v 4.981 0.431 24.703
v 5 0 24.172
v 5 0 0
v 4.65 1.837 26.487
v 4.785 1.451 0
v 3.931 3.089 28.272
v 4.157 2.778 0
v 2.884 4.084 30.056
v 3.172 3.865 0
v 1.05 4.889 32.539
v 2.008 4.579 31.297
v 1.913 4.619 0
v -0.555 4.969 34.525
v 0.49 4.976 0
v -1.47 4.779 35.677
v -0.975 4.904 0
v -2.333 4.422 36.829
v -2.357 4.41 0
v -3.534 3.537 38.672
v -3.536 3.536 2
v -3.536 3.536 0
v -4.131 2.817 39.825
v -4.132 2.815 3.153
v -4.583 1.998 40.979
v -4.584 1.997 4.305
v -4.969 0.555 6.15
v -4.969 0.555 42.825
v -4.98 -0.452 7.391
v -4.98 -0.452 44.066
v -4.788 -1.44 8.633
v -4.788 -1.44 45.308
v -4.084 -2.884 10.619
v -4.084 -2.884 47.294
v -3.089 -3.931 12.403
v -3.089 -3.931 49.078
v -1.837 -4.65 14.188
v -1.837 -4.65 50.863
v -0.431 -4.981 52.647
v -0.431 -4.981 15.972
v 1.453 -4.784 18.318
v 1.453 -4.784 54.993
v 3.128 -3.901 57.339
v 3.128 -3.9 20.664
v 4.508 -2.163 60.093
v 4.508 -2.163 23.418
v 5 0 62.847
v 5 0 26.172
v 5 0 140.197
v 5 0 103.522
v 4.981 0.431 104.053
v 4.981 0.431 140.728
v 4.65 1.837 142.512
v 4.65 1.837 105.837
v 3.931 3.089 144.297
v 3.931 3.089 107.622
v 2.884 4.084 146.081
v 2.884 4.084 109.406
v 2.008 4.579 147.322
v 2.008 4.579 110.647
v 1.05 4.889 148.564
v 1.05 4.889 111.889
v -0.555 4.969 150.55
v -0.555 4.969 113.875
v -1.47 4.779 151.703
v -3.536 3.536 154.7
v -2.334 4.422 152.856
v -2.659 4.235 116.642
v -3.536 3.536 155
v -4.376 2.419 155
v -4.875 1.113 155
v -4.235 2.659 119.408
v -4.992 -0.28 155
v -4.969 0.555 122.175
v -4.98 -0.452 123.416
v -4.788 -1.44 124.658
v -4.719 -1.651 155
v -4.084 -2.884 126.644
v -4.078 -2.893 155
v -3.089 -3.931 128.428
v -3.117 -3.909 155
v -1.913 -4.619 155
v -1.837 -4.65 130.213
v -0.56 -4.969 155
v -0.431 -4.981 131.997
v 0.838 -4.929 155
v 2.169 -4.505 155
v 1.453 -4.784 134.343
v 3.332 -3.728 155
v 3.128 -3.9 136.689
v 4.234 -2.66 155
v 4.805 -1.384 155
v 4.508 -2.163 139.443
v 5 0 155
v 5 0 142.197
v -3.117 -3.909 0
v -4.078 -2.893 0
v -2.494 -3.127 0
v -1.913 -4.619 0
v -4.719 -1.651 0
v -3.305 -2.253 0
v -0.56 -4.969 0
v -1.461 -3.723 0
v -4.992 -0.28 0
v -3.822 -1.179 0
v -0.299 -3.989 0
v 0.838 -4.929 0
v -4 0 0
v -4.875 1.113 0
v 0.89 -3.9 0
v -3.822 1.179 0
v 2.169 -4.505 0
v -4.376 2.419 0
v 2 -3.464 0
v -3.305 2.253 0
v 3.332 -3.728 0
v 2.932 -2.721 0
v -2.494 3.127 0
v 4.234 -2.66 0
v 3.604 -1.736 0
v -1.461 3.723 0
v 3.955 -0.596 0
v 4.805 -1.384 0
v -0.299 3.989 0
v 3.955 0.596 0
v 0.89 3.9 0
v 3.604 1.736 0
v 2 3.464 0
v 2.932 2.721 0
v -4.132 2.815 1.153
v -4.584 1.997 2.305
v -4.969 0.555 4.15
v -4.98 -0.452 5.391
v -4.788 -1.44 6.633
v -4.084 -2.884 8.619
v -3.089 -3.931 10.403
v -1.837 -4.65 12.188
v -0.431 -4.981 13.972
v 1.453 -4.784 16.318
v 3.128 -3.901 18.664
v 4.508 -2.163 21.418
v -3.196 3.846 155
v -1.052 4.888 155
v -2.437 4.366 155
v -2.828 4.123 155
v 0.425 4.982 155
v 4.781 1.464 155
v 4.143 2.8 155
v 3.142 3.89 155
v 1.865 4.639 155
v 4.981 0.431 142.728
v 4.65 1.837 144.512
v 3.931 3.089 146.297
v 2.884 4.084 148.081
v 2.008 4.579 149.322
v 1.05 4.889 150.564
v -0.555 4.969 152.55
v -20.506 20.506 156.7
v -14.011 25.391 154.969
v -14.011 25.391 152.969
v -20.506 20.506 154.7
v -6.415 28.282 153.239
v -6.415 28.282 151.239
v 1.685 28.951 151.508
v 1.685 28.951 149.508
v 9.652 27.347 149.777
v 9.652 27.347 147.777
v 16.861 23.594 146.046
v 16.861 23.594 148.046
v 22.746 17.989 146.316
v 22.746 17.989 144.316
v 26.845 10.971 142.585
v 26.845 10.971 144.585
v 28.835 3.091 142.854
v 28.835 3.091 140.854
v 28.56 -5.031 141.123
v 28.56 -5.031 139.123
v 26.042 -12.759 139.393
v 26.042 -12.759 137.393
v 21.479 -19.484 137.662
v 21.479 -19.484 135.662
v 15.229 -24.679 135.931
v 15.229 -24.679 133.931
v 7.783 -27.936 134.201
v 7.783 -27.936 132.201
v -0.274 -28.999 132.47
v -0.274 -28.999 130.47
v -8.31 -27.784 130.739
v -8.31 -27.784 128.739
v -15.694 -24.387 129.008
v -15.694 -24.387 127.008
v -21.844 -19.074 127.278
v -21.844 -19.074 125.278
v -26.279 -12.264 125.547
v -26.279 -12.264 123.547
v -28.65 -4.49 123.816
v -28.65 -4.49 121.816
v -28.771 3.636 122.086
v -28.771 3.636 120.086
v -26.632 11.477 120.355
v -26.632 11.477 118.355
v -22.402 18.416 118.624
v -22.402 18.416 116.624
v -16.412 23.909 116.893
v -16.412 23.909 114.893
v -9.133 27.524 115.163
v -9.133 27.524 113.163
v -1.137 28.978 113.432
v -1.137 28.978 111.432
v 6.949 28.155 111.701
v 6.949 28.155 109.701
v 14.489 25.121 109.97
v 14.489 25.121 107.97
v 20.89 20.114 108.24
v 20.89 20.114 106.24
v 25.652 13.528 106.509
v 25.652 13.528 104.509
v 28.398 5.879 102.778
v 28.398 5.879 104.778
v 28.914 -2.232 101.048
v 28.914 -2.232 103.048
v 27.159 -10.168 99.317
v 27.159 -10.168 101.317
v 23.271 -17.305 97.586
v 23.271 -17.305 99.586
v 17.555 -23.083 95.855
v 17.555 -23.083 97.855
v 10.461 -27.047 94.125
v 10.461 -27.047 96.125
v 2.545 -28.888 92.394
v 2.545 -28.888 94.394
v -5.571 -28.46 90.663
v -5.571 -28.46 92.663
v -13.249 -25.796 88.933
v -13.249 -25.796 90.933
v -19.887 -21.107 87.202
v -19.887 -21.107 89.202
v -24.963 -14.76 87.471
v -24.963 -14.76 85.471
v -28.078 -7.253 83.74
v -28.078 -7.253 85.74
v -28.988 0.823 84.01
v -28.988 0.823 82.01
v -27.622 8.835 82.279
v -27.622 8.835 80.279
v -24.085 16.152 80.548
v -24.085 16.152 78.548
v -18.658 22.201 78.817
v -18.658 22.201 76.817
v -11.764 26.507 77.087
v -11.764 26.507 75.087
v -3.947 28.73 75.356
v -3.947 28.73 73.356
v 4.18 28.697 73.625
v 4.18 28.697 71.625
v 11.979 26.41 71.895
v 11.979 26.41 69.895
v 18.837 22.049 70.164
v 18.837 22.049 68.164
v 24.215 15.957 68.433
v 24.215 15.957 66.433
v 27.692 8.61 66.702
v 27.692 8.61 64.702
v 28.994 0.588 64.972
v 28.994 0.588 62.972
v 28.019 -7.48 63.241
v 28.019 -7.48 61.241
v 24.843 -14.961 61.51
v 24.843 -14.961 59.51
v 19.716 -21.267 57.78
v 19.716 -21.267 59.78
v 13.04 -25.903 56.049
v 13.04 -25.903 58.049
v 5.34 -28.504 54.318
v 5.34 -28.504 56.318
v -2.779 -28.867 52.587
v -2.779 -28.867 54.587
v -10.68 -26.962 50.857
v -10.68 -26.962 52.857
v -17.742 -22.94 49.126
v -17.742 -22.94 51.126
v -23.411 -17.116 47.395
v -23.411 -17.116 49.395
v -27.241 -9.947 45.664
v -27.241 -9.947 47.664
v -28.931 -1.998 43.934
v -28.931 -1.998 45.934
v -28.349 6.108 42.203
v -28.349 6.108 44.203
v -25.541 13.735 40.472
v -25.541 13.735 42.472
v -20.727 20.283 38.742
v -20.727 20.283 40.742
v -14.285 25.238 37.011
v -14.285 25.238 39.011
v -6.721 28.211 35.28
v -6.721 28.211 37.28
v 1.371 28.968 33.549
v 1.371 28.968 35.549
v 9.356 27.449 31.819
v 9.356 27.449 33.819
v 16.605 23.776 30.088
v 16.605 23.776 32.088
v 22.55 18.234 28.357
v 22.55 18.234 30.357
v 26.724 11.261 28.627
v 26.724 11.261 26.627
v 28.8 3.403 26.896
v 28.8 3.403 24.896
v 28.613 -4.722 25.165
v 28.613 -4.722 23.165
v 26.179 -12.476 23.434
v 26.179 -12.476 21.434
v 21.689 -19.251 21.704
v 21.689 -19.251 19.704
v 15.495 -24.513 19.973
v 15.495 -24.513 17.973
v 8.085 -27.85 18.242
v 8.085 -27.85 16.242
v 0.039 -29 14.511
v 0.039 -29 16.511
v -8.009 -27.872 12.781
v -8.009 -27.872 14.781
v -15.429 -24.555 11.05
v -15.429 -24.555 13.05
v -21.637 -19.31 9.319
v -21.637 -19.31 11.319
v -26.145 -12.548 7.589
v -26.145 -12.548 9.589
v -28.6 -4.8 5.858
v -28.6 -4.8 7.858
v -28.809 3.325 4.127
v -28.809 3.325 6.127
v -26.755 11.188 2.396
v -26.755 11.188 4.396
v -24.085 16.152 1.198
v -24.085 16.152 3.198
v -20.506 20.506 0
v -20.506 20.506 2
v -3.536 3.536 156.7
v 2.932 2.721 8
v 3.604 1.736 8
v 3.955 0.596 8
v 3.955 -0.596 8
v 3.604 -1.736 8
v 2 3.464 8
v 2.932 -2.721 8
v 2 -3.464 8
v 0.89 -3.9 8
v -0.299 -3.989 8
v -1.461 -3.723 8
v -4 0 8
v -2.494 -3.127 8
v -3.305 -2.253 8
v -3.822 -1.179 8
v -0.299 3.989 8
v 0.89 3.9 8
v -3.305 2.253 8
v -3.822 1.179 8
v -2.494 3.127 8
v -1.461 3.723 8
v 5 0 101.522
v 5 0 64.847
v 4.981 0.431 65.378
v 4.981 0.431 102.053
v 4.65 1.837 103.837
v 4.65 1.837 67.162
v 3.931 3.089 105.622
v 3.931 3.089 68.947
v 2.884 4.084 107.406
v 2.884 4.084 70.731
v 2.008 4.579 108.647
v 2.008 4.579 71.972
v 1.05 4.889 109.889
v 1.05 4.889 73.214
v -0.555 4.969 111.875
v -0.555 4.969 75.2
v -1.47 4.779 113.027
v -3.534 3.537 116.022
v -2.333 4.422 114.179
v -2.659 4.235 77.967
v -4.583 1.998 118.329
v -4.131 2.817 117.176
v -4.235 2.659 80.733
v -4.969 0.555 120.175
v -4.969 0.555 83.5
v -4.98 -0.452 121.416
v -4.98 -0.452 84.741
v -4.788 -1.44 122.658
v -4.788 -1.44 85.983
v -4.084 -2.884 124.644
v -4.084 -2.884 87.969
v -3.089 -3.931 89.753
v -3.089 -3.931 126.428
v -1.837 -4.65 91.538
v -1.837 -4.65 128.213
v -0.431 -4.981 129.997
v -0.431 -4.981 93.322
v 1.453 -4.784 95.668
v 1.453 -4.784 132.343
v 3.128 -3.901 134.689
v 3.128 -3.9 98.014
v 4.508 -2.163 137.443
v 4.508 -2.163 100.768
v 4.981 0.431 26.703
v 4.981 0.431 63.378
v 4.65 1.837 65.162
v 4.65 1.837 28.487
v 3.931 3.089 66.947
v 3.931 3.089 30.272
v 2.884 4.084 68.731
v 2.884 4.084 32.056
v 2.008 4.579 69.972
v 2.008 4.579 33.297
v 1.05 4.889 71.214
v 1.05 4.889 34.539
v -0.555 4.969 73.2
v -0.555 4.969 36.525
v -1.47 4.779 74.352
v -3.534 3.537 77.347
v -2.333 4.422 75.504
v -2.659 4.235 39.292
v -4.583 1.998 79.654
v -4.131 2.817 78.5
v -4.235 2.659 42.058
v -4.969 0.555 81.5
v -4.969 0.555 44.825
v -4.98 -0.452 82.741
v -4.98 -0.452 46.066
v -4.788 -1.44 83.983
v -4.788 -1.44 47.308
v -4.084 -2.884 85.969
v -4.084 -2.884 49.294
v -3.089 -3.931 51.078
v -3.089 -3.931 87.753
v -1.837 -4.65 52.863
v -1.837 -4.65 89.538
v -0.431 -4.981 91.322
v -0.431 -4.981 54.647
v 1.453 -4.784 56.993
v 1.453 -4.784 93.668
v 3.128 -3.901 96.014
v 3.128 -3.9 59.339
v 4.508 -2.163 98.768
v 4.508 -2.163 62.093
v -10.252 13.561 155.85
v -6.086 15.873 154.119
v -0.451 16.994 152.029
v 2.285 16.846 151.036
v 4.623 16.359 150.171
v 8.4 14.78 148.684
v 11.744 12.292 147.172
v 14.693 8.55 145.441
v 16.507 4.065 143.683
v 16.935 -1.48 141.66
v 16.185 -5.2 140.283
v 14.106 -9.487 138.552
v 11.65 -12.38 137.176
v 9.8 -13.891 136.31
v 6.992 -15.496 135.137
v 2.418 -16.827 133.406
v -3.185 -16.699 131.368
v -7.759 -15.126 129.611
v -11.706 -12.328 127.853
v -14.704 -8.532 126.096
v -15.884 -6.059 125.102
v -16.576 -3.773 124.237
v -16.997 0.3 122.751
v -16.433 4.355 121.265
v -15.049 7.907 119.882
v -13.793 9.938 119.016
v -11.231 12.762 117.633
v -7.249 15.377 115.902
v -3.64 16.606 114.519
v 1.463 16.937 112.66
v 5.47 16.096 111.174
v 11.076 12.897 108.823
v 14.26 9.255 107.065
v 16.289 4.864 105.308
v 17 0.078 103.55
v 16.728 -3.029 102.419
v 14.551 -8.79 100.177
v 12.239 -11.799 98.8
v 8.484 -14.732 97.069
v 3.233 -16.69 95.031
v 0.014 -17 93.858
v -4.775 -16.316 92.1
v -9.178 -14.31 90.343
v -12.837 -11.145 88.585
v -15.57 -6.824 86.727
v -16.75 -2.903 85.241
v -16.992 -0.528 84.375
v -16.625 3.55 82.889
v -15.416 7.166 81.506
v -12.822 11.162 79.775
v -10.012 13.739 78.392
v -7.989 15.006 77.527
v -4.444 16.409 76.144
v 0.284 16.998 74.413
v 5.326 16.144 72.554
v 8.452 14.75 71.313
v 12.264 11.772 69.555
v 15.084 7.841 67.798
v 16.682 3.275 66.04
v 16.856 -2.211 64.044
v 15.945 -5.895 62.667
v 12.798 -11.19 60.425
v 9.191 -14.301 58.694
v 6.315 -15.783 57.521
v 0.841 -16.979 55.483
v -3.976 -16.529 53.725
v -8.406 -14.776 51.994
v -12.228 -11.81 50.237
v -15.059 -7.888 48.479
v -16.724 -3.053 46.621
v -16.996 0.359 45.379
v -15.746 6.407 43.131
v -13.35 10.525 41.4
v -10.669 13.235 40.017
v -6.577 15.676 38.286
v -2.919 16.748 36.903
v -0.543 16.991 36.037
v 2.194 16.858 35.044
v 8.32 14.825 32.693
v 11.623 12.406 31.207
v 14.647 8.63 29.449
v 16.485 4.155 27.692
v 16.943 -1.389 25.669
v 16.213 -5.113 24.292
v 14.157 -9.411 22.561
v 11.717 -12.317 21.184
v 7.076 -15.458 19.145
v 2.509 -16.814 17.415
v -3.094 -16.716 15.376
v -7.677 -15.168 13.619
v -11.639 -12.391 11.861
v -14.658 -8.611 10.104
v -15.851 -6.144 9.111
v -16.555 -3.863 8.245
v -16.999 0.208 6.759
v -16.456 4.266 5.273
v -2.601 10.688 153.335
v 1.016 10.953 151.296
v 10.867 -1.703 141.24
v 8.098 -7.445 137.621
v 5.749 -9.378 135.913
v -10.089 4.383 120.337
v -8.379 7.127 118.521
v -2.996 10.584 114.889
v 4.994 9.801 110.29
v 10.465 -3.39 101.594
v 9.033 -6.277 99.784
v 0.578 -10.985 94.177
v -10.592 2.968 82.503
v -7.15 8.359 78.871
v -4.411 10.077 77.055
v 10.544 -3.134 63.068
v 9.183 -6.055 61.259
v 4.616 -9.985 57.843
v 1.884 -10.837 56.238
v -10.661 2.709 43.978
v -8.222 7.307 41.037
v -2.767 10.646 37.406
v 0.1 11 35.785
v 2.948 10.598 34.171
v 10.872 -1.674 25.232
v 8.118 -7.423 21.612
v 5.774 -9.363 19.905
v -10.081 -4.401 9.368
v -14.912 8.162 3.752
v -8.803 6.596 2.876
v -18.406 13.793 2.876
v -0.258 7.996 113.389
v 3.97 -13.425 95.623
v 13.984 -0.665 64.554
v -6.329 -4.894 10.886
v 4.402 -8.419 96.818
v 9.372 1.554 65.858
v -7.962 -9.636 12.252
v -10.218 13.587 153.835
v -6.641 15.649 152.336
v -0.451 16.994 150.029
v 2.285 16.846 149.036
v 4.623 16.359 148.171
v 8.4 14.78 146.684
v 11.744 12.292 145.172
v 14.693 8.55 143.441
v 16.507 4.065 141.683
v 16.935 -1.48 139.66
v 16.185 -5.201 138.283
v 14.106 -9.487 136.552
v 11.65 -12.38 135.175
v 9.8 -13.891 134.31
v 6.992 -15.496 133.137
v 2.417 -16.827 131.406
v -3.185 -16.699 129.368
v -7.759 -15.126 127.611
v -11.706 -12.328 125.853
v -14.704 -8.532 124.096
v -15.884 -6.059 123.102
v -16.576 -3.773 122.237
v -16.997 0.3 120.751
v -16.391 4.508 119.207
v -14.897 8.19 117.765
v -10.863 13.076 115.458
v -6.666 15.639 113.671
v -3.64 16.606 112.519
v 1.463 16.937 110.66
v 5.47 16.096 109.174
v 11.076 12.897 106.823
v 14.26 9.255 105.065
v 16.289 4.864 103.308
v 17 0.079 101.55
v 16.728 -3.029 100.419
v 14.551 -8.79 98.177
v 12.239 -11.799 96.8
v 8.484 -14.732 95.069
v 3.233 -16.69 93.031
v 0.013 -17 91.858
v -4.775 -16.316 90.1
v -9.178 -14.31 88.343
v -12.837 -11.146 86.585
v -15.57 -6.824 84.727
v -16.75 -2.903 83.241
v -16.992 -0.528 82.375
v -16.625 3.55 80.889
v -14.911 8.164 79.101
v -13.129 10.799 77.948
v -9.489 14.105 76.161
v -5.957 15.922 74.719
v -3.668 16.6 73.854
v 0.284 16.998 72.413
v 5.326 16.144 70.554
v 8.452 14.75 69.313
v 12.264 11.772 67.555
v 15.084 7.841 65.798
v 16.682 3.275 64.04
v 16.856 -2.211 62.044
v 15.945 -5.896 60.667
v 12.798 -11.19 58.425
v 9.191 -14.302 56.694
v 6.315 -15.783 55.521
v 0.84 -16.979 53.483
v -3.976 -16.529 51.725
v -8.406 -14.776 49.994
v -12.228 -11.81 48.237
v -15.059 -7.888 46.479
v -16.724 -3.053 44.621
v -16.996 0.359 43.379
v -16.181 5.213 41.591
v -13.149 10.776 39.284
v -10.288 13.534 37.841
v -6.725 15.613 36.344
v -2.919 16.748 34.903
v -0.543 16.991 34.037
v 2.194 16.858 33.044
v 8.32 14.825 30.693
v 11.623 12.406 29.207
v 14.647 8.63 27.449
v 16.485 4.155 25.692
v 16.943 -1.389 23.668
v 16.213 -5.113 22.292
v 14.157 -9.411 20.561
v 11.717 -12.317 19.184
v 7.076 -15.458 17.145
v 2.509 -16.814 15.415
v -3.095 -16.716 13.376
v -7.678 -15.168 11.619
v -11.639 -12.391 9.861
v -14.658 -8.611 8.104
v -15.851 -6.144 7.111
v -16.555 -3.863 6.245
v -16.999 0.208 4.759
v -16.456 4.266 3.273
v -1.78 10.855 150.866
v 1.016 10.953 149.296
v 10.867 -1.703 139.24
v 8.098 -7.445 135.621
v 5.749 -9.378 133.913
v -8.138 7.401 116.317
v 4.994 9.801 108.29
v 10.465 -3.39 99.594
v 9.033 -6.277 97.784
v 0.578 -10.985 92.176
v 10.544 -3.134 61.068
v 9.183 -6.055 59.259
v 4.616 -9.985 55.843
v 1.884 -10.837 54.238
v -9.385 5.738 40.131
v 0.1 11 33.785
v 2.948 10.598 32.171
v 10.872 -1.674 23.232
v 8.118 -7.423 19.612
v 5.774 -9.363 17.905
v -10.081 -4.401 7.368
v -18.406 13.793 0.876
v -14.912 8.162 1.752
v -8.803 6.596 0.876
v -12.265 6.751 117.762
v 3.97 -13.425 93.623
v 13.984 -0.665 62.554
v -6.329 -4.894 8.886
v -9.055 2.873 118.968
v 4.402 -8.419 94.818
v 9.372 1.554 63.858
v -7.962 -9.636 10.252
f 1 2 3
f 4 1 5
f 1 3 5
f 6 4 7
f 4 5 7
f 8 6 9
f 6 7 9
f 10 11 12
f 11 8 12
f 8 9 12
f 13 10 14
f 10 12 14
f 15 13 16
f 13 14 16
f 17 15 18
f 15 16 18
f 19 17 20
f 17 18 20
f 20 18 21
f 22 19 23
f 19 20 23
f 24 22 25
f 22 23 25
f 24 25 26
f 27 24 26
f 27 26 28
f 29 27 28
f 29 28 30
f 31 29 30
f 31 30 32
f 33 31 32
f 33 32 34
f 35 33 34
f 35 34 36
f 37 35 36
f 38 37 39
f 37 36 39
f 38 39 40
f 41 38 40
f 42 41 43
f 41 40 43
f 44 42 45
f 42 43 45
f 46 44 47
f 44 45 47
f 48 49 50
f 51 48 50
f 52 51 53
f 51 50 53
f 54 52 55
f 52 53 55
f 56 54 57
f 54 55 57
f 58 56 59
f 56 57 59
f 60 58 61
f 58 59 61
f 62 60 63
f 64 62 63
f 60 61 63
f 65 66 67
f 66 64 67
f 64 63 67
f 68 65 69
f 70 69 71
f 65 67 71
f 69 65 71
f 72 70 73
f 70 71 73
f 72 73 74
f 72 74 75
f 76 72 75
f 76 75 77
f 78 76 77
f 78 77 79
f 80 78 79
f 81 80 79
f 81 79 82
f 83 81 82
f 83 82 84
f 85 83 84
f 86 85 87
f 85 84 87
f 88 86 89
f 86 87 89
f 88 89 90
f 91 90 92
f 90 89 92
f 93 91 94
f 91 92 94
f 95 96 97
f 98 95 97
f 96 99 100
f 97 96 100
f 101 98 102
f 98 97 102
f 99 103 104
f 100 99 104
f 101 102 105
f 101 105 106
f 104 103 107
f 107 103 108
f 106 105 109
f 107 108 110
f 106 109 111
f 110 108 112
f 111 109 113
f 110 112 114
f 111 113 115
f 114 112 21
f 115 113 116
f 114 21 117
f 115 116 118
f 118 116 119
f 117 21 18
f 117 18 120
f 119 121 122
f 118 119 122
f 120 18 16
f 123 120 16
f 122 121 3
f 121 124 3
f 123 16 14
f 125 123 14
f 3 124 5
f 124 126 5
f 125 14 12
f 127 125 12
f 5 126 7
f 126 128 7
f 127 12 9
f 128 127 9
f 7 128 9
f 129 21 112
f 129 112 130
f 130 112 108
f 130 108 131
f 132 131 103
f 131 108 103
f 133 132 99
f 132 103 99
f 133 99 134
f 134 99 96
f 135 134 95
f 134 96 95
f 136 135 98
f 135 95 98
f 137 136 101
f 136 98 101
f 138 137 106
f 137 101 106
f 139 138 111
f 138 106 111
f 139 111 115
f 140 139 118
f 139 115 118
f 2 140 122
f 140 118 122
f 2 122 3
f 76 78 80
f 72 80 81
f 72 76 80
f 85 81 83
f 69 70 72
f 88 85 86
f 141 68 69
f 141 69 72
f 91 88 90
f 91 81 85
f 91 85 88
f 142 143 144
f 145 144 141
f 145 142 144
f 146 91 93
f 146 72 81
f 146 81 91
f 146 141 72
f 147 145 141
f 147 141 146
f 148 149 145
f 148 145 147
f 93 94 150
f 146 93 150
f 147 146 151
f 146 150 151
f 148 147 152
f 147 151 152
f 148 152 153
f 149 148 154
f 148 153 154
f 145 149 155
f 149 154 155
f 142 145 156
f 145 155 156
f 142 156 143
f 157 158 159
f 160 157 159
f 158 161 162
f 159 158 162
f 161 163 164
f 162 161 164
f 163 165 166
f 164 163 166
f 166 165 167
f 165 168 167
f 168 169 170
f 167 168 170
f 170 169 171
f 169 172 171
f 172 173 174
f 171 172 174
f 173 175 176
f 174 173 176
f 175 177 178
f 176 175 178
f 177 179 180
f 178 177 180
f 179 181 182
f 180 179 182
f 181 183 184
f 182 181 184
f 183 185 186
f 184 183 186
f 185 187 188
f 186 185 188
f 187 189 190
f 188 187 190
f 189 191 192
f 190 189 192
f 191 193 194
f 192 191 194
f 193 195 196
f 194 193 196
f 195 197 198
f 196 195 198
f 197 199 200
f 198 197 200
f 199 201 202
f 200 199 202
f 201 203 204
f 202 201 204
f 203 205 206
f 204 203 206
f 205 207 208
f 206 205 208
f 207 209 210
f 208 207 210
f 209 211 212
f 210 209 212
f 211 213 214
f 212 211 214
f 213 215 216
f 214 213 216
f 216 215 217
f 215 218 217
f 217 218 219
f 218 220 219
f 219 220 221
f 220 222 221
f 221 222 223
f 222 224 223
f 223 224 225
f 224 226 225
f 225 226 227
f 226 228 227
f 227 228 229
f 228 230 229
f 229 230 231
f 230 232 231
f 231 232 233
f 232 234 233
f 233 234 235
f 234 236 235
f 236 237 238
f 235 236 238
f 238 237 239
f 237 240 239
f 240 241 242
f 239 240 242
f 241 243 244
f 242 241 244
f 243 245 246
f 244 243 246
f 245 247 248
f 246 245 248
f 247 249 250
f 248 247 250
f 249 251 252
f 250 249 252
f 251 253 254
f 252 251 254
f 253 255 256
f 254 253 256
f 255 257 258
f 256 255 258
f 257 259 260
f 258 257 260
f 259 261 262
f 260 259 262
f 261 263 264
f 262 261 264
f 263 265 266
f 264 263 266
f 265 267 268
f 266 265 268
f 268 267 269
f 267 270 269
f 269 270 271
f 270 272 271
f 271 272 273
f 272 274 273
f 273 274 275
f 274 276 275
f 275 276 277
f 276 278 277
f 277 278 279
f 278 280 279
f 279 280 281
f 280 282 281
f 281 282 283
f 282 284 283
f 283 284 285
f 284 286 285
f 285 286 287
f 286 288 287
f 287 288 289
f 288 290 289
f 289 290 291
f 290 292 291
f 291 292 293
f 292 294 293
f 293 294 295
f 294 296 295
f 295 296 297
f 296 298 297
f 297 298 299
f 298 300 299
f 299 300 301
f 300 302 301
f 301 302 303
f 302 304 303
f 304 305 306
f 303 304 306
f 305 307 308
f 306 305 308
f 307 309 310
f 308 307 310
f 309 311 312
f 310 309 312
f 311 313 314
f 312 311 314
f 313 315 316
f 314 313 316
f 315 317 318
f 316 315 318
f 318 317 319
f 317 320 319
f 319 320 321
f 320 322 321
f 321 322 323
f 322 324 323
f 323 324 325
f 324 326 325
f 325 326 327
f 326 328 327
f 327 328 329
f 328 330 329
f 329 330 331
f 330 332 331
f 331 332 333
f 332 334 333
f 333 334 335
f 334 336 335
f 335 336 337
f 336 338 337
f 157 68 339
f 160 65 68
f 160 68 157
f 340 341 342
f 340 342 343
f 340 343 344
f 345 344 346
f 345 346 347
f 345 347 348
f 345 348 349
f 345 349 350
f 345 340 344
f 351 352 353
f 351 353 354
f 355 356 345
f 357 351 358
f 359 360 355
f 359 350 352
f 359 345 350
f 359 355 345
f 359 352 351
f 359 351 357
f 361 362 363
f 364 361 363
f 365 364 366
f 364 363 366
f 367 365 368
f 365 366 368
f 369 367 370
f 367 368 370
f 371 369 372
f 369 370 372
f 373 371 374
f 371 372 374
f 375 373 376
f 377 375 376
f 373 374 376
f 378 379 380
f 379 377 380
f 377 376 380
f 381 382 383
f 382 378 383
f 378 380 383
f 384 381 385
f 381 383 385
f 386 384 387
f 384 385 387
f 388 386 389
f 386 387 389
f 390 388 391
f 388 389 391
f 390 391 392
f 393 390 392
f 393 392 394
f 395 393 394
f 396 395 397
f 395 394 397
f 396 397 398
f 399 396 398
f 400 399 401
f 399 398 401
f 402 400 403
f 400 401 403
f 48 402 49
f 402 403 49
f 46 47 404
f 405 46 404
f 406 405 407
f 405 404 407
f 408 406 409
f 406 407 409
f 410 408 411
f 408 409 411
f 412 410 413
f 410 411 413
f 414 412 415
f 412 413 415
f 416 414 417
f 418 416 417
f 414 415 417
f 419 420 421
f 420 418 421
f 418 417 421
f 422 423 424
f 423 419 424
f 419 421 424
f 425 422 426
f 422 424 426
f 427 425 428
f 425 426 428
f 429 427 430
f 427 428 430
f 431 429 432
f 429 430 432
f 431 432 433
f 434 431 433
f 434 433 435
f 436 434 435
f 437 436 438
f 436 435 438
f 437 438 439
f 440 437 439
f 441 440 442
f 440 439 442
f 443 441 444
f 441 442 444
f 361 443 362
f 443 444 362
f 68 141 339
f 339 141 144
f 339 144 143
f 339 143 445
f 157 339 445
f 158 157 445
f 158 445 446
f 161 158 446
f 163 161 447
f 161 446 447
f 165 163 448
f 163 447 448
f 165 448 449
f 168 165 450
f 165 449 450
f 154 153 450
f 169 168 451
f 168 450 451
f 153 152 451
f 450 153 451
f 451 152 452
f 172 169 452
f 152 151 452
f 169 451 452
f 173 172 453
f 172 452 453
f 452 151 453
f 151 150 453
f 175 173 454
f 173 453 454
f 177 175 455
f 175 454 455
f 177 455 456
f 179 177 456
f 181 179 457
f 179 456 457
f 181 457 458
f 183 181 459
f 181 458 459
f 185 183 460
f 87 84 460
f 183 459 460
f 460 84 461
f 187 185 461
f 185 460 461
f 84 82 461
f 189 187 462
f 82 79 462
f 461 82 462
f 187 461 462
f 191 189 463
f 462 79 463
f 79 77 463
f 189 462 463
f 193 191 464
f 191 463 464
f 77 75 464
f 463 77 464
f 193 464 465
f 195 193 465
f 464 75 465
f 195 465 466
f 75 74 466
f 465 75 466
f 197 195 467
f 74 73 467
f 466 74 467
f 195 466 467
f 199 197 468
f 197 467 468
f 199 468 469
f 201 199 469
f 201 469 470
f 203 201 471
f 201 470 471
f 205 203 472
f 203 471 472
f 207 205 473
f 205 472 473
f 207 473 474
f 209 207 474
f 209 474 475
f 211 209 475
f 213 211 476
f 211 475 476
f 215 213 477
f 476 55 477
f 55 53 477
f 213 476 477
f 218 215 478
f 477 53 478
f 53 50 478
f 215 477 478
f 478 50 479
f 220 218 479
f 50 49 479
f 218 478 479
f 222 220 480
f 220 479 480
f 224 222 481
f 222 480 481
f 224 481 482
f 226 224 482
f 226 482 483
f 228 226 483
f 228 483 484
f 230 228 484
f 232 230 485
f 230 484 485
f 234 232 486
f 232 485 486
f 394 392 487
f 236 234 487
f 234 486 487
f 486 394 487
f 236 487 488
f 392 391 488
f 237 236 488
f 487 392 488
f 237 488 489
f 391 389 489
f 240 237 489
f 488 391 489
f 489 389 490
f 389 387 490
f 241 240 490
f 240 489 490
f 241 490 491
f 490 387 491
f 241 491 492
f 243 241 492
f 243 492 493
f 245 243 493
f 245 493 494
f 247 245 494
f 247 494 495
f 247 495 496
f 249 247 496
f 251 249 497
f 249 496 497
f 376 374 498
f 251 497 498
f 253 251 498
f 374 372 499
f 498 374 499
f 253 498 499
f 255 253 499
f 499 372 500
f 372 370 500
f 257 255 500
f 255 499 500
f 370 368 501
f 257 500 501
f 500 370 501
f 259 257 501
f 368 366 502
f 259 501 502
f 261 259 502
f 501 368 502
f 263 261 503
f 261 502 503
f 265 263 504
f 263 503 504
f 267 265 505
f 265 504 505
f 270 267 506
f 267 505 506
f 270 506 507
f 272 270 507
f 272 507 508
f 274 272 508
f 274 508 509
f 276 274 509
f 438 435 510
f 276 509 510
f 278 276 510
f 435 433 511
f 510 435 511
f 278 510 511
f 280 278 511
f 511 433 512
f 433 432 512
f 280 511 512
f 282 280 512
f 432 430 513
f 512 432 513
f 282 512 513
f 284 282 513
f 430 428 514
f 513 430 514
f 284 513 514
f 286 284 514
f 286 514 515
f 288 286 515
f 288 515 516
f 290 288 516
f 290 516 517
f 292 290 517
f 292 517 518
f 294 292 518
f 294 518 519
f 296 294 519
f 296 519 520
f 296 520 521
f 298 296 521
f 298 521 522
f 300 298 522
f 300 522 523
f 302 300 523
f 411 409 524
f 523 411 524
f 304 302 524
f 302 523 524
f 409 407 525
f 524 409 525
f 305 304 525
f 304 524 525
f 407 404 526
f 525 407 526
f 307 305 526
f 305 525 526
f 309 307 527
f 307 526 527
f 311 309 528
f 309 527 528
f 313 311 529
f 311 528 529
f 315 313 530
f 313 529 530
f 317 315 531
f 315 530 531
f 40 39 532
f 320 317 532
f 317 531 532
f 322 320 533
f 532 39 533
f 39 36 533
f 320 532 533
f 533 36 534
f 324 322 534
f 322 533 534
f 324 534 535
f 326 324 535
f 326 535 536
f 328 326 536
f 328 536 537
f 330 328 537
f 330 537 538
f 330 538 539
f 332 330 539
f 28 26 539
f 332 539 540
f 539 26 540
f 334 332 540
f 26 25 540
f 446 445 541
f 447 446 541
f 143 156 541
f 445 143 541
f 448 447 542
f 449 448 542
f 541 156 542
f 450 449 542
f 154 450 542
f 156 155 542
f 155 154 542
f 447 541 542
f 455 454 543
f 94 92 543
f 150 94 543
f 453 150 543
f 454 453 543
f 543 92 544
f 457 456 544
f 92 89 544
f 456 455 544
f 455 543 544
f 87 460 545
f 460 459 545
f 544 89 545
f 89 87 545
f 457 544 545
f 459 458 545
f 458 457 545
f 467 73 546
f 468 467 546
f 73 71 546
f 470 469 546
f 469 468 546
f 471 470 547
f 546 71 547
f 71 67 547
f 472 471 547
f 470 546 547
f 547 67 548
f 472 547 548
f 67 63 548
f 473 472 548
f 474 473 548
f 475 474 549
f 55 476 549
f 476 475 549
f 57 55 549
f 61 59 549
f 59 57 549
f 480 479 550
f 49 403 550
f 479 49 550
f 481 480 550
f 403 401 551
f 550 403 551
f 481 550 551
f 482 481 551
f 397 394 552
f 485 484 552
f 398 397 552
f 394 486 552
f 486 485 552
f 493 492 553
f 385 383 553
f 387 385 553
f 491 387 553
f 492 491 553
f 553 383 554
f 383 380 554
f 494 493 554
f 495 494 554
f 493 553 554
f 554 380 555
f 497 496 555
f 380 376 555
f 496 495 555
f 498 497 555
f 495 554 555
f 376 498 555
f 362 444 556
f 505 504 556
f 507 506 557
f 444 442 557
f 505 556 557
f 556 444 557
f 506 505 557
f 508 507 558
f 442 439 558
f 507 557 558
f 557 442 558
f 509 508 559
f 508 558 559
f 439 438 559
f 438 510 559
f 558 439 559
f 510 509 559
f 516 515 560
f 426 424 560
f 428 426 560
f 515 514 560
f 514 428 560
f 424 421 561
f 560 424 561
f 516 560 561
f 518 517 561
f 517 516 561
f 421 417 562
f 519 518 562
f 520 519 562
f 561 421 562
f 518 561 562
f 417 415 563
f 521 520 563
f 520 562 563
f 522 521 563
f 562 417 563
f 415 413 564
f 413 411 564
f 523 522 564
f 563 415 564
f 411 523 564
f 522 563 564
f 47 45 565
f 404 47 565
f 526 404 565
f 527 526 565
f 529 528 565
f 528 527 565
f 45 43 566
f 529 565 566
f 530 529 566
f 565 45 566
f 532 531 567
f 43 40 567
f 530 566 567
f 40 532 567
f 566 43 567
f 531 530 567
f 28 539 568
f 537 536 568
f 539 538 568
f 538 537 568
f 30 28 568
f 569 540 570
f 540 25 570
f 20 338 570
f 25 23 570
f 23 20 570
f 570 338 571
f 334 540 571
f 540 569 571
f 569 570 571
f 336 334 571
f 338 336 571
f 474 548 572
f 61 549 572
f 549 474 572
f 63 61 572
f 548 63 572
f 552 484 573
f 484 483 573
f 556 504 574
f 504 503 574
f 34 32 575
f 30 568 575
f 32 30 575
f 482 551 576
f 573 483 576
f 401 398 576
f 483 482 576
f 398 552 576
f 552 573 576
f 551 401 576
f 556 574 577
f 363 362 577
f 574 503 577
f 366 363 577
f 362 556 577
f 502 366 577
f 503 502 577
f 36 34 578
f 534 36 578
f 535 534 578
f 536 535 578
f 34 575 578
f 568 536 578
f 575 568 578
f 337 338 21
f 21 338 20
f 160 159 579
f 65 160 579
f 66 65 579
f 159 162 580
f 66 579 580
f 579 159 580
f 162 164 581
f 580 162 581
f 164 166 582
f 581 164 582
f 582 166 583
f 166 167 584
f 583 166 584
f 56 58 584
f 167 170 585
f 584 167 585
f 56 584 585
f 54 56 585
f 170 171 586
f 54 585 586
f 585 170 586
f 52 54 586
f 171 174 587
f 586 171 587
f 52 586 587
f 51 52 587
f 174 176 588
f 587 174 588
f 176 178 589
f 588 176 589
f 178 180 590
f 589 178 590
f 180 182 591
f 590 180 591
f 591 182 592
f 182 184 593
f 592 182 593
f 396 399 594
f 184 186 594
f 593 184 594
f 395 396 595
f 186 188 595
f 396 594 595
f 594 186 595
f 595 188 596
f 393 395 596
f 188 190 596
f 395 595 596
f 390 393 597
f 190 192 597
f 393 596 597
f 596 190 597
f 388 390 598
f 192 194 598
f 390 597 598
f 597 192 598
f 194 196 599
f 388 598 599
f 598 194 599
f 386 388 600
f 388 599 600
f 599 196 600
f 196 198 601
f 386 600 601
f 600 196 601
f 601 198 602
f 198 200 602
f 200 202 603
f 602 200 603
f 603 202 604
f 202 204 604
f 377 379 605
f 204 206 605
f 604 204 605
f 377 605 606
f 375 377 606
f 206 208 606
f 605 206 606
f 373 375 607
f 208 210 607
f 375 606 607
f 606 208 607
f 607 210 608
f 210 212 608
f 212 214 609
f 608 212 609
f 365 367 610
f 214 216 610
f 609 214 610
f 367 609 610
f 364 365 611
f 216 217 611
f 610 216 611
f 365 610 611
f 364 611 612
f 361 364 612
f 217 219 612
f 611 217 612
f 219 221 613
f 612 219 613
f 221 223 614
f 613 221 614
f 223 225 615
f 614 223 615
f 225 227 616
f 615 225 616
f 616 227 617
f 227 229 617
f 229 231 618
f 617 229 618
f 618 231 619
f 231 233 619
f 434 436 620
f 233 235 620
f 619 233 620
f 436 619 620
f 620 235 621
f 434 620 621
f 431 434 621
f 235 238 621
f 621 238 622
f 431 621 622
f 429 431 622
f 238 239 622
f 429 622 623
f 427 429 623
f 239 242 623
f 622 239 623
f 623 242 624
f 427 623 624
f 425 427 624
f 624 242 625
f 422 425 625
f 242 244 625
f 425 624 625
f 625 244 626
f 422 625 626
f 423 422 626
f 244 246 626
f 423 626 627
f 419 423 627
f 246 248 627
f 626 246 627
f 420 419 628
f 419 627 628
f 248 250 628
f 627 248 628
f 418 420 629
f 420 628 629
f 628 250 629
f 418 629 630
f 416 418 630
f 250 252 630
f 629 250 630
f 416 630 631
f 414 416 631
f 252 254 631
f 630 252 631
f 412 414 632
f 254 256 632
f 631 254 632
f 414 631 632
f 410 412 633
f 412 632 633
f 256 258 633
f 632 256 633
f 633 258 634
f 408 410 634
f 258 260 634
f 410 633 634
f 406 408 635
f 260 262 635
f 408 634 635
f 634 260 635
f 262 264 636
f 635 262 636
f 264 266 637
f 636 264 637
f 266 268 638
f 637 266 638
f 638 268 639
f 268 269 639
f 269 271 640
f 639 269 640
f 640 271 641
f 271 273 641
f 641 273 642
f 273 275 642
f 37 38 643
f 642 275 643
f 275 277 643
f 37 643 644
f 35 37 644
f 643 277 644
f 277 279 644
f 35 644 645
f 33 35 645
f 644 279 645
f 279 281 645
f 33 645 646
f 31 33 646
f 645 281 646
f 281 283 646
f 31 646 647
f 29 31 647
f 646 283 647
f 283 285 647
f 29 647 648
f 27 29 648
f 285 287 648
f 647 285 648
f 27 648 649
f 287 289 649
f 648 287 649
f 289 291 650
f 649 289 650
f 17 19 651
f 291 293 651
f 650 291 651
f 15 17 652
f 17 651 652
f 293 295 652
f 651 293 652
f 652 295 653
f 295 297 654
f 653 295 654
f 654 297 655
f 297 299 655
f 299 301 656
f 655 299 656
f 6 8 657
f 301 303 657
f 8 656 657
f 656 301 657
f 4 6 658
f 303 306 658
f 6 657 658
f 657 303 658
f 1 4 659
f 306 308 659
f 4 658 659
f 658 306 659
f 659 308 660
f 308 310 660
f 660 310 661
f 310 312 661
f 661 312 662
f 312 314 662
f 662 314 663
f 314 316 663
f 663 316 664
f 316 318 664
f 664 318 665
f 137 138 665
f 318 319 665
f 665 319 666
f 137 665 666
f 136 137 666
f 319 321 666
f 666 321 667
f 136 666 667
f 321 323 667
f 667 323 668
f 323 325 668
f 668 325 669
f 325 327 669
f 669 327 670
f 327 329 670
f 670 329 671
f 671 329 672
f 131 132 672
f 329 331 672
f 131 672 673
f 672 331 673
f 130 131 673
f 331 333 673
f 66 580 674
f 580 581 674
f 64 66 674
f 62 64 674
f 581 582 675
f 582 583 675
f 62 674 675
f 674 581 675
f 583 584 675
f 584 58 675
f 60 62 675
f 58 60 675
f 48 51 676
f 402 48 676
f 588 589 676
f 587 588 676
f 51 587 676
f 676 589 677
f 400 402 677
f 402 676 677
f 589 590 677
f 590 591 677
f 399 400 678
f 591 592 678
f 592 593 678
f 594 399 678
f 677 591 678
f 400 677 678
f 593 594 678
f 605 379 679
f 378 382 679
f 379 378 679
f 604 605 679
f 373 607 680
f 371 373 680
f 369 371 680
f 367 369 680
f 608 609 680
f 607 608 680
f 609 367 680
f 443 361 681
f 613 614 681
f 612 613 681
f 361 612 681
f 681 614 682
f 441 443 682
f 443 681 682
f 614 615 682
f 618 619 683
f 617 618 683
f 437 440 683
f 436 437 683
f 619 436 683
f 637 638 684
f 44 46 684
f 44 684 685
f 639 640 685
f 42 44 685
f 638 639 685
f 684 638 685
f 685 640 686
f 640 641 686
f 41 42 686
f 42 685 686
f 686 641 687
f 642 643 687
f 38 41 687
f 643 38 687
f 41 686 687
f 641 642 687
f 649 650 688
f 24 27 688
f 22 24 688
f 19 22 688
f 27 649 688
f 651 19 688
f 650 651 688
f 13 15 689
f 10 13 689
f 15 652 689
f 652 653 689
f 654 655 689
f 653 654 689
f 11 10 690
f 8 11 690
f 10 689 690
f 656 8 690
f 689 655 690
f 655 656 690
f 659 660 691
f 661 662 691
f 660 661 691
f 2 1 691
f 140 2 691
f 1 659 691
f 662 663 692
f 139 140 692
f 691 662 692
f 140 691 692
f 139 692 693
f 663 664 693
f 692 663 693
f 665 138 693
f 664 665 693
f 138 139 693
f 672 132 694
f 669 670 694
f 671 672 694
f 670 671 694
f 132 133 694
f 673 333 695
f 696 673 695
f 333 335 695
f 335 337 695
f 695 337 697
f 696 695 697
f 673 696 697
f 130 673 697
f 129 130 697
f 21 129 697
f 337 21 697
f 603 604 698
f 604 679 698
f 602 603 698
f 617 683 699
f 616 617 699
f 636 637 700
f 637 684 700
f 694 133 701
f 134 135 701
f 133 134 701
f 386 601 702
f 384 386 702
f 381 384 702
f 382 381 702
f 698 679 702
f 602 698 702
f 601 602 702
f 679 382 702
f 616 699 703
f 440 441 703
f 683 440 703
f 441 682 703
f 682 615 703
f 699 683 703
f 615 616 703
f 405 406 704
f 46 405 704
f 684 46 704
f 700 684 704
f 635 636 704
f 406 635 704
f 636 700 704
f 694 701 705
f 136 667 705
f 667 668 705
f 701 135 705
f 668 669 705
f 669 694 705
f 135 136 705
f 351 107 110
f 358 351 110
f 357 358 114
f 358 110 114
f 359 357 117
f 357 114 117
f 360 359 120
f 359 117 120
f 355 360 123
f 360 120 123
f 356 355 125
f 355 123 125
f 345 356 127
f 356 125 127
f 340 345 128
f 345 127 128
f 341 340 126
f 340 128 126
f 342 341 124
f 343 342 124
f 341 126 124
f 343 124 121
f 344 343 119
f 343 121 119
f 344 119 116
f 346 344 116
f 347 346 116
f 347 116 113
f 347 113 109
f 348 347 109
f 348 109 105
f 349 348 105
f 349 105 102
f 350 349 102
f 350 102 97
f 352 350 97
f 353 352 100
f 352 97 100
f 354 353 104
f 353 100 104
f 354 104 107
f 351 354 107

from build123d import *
from build123d.topology import SkipClean

# Parameters (mm, degrees)
SKETCH_1_R          = 5
EXTRUDE_1_DEPTH     = 155
SWEEP_1_PITCH       = 38.675
SWEEP_1_HEIGHT      = 154.7
SWEEP_1_RADIUS      = 5
SWEEP_1_START_ANGLE = 45
SKETCH_4_W          = 2
SKETCH_4_H          = 24
SKETCH_5_R          = 4
CUT_EXTRUDE_1_DEPTH = 8


with BuildPart() as part:
    # 草图1 → 凸台-拉伸1 (new body)
    with BuildSketch(Plane.XY):
        Circle(SKETCH_1_R)
    extrude(amount=EXTRUDE_1_DEPTH)

    # 扫描1: sweep along a helix
    with SkipClean():  # the faces are left unmerged after this step: merging them gives an invalid solid
        with BuildLine() as sweep_1_path:
            add(Helix(SWEEP_1_PITCH, SWEEP_1_HEIGHT, SWEEP_1_RADIUS, center=(0, 0, 155), direction=(0, 0, -1), mode=Mode.PRIVATE).rotate(Axis((0, 0, 155), (0, 0, -1)), SWEEP_1_START_ANGLE))
        # 草图4 → 扫描1 (sweep)
        with BuildSketch(Plane(origin=(-3.535533906, 3.535533906, 0.3), x_dir=(0, 0, 1), z_dir=(-0.7071067811866223, -0.7071067811864729, 0))):
            with Locations((0.7, 12)):
                Rectangle(SKETCH_4_W, SKETCH_4_H)
        sweep(path=sweep_1_path.line, is_frenet=True)

    # 草图5 → 切除-拉伸1 (cut)
    with SkipClean():  # the faces are left unmerged after this step: merging them gives an invalid solid
        with BuildSketch(Plane(origin=(0, 0, 0), x_dir=(-1, 0, 0), z_dir=(0, 0, -1))):
            Circle(SKETCH_5_R)
        extrude(amount=-CUT_EXTRUDE_1_DEPTH, mode=Mode.SUBTRACT)


solid = part.part
